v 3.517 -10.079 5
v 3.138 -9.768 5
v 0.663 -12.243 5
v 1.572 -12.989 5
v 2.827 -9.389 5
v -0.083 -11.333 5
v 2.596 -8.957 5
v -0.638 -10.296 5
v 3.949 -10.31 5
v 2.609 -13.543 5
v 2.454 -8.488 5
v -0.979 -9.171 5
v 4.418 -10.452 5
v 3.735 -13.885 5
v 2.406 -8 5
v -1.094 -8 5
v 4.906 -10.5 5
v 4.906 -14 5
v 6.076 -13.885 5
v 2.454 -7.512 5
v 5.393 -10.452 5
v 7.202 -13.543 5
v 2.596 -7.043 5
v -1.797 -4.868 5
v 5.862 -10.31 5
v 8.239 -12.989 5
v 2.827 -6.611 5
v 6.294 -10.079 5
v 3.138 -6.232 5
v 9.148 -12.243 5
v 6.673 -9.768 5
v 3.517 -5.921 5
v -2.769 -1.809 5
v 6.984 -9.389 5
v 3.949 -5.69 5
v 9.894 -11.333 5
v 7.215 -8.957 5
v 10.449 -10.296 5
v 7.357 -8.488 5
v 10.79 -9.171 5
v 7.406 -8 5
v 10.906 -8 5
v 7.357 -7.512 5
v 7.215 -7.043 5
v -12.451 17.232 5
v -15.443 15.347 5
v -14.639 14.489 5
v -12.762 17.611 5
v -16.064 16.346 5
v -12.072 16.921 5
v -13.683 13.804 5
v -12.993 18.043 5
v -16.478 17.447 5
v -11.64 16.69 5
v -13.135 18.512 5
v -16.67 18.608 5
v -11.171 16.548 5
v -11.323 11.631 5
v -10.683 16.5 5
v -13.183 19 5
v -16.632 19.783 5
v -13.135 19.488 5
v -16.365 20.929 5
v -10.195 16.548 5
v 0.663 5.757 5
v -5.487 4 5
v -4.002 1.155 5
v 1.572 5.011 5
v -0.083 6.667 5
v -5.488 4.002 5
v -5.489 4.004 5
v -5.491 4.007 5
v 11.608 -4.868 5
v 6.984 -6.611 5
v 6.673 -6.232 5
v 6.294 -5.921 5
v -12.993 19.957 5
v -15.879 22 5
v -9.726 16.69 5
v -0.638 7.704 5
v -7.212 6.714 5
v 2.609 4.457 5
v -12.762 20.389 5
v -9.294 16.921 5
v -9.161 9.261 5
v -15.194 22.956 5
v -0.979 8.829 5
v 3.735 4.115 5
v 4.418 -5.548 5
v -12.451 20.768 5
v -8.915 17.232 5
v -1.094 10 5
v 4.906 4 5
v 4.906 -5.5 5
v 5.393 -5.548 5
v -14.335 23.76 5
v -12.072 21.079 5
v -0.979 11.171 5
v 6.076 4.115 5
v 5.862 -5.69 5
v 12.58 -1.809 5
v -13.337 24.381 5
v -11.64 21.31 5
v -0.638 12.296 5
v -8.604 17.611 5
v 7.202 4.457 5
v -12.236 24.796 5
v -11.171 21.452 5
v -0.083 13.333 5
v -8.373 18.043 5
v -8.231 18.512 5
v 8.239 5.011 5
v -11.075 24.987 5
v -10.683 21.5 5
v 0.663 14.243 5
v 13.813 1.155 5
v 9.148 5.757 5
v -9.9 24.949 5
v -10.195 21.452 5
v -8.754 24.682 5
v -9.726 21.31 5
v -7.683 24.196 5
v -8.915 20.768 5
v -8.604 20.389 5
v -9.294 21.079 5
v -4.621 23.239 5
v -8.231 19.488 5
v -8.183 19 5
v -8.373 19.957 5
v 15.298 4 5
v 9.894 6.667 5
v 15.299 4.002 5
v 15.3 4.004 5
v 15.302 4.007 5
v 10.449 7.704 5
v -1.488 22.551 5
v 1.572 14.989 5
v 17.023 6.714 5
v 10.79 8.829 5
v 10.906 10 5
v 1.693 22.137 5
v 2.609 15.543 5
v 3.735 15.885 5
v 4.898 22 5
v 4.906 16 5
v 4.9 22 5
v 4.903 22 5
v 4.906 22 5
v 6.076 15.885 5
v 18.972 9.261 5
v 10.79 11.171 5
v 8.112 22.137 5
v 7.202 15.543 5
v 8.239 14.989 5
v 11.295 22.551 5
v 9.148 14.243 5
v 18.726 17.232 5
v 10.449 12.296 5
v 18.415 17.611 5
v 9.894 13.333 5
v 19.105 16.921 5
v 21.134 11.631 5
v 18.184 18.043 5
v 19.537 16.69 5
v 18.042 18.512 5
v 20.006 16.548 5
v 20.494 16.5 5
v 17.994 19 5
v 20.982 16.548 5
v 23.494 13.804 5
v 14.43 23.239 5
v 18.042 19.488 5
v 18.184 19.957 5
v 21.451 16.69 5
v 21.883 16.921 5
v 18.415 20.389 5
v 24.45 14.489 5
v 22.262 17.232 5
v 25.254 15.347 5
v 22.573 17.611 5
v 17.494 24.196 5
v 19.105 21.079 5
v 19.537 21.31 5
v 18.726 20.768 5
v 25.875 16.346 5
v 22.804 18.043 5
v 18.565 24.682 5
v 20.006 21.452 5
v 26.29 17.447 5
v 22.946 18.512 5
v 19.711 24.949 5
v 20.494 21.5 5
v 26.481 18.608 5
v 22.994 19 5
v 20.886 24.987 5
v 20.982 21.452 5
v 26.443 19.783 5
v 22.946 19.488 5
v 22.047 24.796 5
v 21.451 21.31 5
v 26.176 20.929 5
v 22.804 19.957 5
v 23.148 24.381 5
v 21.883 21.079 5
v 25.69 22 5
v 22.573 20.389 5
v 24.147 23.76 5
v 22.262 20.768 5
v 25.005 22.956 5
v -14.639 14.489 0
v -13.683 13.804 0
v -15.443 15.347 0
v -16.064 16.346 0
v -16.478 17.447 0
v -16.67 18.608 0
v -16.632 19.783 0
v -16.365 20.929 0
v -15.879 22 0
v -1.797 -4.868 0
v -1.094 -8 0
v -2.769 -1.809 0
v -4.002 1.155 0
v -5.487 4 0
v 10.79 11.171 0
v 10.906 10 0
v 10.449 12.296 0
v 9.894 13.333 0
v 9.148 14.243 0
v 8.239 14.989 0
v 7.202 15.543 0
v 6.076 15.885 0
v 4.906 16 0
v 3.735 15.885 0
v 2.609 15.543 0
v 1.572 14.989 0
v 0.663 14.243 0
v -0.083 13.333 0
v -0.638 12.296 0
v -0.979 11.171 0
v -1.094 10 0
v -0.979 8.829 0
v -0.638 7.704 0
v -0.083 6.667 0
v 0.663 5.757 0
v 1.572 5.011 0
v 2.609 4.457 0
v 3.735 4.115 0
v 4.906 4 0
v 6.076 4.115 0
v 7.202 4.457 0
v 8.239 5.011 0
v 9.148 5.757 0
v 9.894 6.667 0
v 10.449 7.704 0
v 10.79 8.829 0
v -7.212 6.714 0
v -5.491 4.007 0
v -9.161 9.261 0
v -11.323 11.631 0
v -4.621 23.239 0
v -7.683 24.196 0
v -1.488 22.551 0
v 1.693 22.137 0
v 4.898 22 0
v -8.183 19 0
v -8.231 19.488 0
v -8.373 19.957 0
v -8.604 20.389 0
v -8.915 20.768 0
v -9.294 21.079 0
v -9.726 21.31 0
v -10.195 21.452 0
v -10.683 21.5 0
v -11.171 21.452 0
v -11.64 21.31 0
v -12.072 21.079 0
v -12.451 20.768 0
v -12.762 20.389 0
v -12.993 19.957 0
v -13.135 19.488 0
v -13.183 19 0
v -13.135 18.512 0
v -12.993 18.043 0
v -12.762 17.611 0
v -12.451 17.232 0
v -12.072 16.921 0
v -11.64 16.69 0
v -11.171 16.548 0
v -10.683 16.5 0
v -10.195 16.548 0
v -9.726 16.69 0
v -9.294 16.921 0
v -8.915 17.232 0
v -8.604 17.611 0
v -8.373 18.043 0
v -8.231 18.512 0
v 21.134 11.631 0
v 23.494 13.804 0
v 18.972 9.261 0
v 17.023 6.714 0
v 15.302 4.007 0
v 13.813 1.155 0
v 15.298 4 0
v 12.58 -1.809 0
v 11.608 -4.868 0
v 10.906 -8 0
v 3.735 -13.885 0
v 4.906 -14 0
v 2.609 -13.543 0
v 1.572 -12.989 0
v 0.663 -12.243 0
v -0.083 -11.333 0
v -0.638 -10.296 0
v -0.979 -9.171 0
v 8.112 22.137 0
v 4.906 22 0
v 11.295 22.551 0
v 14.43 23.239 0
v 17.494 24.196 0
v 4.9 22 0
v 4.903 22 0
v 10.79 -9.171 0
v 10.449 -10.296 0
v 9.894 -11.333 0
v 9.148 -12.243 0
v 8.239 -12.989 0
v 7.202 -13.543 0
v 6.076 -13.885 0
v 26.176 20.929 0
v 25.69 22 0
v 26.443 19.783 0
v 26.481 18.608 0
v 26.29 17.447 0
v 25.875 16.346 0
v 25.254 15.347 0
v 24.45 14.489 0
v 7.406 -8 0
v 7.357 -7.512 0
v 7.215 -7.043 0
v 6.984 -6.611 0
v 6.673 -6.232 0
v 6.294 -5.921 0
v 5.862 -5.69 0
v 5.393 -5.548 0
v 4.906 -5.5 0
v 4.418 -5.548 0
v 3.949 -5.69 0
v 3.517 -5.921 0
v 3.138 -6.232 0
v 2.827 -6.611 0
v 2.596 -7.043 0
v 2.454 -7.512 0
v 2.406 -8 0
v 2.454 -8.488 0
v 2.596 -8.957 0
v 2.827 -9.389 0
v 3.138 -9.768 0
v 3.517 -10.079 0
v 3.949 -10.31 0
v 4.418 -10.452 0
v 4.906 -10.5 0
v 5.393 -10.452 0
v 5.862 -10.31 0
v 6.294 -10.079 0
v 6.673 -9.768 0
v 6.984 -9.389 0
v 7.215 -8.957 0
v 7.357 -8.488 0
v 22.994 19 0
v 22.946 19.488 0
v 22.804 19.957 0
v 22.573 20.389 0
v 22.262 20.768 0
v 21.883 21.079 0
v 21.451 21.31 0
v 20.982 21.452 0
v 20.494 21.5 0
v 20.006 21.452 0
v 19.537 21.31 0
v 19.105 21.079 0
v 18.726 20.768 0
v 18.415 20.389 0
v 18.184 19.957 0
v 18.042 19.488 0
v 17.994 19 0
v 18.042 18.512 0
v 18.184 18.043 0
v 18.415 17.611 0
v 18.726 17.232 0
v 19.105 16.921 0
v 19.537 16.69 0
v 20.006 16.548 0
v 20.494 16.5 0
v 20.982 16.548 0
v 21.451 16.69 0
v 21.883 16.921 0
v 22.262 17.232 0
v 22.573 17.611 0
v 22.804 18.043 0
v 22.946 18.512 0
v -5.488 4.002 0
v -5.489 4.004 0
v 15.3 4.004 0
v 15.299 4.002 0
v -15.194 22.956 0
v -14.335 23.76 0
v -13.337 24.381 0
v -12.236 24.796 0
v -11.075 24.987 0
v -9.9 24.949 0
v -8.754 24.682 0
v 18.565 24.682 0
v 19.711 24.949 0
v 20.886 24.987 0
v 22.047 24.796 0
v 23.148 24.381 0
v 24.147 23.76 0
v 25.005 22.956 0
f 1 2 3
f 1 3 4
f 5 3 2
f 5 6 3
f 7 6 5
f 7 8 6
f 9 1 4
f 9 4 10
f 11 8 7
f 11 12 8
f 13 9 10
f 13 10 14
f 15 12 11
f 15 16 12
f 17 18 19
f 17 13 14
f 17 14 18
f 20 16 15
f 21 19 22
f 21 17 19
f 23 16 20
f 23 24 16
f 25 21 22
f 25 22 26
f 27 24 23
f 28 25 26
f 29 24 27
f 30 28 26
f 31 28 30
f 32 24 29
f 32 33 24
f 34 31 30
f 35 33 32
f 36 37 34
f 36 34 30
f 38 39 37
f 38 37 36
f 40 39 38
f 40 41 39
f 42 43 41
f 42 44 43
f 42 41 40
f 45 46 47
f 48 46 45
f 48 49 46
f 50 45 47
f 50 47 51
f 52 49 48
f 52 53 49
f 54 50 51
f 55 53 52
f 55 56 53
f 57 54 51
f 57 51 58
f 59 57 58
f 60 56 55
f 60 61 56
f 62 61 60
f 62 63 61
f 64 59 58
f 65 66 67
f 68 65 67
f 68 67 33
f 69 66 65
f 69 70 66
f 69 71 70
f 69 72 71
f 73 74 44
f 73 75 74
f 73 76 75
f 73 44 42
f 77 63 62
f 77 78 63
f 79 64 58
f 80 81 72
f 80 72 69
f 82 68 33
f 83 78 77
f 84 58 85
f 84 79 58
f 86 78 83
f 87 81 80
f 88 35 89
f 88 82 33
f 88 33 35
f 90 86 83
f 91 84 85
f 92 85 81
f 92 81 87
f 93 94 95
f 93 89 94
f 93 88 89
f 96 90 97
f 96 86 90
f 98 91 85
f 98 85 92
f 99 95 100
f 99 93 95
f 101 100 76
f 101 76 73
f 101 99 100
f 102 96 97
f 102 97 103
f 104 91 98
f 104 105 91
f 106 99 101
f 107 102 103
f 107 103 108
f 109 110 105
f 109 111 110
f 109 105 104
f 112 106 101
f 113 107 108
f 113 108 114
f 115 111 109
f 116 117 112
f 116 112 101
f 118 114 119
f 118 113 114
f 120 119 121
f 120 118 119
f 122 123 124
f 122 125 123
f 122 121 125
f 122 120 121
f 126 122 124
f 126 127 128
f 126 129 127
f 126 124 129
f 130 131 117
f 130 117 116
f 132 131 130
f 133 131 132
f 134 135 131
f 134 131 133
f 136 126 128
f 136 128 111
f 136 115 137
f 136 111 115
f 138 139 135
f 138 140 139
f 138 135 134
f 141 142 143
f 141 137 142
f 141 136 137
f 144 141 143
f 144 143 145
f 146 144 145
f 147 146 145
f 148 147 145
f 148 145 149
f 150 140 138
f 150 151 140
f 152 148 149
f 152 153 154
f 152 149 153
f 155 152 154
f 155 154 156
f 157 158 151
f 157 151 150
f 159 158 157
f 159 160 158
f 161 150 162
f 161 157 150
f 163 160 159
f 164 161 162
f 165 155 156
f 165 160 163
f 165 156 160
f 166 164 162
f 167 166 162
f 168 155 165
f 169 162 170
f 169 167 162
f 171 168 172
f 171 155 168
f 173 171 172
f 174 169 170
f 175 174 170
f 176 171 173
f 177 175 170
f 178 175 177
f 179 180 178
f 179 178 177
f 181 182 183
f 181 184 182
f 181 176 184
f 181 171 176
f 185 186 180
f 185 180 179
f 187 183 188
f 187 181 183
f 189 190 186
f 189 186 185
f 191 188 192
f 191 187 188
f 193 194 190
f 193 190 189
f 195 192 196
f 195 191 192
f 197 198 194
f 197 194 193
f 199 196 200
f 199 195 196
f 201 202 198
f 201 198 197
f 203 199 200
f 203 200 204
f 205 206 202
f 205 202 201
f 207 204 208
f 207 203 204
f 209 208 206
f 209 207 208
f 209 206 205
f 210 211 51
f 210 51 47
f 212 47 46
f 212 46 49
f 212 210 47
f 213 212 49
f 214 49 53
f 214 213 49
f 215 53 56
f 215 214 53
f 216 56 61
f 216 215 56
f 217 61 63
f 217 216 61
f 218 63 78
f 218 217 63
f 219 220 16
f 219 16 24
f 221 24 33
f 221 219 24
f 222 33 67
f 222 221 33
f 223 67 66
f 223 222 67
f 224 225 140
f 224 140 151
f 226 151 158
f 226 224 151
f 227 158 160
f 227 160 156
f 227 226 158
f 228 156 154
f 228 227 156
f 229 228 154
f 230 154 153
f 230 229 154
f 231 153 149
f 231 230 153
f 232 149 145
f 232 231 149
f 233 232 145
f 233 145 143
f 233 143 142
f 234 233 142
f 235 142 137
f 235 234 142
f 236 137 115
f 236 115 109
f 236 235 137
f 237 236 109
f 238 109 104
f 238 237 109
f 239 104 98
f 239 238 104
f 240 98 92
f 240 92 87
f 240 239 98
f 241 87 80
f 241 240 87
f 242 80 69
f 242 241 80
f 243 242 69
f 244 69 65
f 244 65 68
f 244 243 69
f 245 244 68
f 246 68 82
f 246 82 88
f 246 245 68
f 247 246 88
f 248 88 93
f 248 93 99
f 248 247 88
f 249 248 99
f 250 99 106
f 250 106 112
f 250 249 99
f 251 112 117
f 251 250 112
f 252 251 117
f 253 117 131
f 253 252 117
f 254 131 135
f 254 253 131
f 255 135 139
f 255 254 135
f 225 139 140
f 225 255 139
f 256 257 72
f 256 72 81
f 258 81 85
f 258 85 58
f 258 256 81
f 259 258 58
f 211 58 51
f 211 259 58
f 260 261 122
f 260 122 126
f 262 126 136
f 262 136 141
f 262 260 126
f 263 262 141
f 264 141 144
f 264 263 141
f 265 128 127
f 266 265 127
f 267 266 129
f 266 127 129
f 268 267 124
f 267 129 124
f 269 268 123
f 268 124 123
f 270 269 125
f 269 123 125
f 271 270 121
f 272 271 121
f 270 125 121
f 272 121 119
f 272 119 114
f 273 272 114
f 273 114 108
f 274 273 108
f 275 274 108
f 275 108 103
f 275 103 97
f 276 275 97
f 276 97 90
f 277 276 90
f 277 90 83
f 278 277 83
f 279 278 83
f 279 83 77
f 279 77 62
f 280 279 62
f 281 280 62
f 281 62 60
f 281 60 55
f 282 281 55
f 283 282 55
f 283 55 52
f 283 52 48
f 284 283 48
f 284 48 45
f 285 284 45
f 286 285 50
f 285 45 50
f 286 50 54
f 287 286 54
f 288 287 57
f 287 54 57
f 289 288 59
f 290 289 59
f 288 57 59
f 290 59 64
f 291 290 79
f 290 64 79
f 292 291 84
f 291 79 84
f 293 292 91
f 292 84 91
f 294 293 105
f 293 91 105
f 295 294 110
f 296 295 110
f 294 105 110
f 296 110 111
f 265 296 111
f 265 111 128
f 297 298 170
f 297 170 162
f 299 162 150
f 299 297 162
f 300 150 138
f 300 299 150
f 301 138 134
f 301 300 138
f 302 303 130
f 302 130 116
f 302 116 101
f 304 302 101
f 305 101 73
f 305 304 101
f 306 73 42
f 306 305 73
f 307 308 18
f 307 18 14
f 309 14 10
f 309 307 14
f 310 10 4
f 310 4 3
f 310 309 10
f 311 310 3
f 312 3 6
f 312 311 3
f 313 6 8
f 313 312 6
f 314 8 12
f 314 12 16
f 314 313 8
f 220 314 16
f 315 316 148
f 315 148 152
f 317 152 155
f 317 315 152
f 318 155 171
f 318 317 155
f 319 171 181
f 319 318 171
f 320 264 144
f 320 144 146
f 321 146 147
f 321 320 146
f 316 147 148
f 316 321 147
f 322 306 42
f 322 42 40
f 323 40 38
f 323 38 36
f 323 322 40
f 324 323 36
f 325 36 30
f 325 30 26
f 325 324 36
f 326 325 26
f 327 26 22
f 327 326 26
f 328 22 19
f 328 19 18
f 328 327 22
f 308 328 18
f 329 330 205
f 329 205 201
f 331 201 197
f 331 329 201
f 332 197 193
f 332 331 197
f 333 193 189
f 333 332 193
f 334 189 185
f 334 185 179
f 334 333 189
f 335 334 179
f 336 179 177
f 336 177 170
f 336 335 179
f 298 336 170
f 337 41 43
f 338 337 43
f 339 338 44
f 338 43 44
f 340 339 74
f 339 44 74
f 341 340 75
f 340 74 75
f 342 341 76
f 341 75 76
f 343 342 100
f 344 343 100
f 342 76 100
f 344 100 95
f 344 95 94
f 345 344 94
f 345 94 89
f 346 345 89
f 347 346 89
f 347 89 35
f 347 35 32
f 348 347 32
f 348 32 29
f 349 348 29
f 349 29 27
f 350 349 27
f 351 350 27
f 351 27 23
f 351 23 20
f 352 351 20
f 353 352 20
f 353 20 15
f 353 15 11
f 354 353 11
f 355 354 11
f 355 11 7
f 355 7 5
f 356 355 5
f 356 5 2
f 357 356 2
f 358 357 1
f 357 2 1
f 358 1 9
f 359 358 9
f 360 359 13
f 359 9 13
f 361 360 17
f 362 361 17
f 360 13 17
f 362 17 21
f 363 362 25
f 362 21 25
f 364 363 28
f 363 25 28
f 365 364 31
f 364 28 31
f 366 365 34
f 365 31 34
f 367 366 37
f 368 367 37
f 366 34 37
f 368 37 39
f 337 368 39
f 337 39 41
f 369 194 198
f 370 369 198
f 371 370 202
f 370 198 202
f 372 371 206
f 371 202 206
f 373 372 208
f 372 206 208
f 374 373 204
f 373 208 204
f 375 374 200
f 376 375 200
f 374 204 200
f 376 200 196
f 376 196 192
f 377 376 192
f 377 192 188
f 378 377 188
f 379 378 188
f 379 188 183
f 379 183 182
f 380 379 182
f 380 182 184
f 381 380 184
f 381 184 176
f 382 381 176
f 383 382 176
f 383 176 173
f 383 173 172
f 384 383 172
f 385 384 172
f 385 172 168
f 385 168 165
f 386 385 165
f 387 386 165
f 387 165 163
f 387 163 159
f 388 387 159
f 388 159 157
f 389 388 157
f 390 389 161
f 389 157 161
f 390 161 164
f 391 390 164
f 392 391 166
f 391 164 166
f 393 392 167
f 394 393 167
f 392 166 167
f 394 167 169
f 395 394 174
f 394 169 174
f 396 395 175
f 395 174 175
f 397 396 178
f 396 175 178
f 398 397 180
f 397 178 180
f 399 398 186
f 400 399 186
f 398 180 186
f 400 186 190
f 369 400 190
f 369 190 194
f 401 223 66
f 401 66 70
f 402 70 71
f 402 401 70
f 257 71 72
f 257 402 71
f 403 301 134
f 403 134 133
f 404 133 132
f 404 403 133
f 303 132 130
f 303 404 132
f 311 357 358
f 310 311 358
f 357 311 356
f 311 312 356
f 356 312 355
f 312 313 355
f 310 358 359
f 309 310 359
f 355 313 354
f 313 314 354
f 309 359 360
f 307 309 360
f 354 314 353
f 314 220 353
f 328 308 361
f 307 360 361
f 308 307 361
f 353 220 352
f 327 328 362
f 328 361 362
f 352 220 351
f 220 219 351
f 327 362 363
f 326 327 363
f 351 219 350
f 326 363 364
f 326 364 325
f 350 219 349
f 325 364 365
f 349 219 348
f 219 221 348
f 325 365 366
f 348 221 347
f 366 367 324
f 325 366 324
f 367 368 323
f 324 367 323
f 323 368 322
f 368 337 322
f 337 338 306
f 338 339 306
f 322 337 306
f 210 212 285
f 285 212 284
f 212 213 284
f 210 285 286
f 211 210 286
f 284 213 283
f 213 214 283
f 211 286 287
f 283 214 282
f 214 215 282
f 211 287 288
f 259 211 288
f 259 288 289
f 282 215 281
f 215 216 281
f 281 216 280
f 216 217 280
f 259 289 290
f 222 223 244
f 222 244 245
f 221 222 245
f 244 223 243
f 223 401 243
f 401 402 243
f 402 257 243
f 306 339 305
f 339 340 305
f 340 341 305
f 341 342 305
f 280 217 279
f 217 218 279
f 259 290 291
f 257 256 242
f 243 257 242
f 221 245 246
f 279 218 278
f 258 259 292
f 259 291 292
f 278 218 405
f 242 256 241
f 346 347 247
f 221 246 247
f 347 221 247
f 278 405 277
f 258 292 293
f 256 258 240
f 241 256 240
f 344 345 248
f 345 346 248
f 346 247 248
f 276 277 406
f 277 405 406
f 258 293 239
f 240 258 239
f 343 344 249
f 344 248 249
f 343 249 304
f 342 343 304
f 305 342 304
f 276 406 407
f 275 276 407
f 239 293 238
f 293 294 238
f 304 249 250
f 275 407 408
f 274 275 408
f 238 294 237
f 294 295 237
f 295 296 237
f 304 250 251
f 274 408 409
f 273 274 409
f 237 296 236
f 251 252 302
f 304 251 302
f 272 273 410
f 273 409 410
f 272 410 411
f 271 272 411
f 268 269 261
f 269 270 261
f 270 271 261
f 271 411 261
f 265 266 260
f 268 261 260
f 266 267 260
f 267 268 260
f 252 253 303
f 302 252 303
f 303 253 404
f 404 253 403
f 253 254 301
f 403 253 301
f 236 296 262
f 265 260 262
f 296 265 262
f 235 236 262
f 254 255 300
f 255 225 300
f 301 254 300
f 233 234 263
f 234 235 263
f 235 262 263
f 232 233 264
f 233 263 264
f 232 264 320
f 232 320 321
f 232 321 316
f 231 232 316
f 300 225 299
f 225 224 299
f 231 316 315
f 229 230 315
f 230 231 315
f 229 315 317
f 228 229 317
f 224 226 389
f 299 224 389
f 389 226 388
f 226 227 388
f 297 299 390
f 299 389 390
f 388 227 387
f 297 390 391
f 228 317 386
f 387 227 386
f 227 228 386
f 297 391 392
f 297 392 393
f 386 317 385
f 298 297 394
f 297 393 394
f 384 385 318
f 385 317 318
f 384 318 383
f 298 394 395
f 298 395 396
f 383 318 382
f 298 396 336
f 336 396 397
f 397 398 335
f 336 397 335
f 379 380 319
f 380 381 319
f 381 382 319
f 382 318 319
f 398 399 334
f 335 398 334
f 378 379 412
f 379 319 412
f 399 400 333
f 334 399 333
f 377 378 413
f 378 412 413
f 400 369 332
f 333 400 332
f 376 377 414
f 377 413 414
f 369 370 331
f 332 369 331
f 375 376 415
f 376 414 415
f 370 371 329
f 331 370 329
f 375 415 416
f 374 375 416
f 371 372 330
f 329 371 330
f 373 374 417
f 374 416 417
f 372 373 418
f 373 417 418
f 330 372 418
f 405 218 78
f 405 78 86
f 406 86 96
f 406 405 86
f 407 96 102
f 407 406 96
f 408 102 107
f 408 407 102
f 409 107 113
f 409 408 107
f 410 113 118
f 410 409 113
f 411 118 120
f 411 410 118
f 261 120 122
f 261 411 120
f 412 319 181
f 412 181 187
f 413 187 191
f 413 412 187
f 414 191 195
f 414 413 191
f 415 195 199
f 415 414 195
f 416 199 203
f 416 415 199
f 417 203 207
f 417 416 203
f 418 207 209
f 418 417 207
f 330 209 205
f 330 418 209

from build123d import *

# Parameters (mm, degrees)
ESBO_O1_R                 = 24
ESBO_O1_R_2               = 6
RESSALTO_EXTRUS_O1_DEPTH  = 5
ESBO_O2_R                 = 2.5
CORTE_EXTRUS_O1_DEPTH     = 45.905785333
CORTE_EXTRUS_O2_START     = -5
CORTE_EXTRUS_O2_OUTLINE_R = 2.5
CORTE_EXTRUS_O2_DEPTH     = 5


# Read off the part's stored shape, not the designer's step: Corte-extrusão2
with BuildPart() as part:
    # Esboço1 → Ressalto-extrusão1 (new body)
    with BuildSketch(Plane.XY):
        with Locations((4.905528128, 10)):
            Circle(ESBO_O1_R)
        with Locations((4.905528128, 10)):
            Circle(ESBO_O1_R_2, mode=Mode.SUBTRACT)
    extrude(amount=RESSALTO_EXTRUS_O1_DEPTH)

    # Esboço2 → Corte-extrusão1 (cut, through all)
    with BuildSketch(Plane.XY.offset(5)):
        with Locations((4.905528128, 28)):
            Circle(ESBO_O2_R)
        with Locations((20.493985396, 19)):
            Circle(ESBO_O2_R)
        with Locations((20.493985396, 1)):
            Circle(ESBO_O2_R)
        with Locations((4.905528128, -8)):
            Circle(ESBO_O2_R)
        with Locations((-10.68292914, 1)):
            Circle(ESBO_O2_R)
        with Locations((-10.68292914, 19)):
            Circle(ESBO_O2_R)
    extrude(amount=-CORTE_EXTRUS_O1_DEPTH, mode=Mode.SUBTRACT)

    # Corte-extrusão2 outline → Corte-extrusão2 (cut)
    # profile 1 of 3: a face of its own
    with BuildSketch(Plane.XY.offset(5).offset(CORTE_EXTRUS_O2_START)):
        with BuildLine():
            ThreePointArc((4.897969025, 21.999997619), (4.901748576, 21.999999405), (4.905528128, 22))
            ThreePointArc((4.905528128, 22), (11.295284197, 22.550508098), (17.493985396, 24.196152423))
            ThreePointArc((17.493985396, 24.196152423), (22.046899667, 24.795554958), (25.690137819, 22))
            ThreePointArc((25.690137819, 22), (4.905528128, 34), (-15.879081563, 22))
            ThreePointArc((-15.879081563, 22), (-12.235843411, 24.795554958), (-7.68292914, 24.196152423))
            ThreePointArc((-7.68292914, 24.196152423), (-1.487951224, 22.551157849), (4.897969025, 21.999997619))
        make_face()
        with Locations((4.905528128, 28)):
            Circle(CORTE_EXTRUS_O2_OUTLINE_R, mode=Mode.SUBTRACT)
    # profile 2 of 3: a face of its own
    with BuildSketch(Plane.XY.offset(5).offset(CORTE_EXTRUS_O2_START)):
        with BuildLine():
            ThreePointArc((4.905528128, -14), (25.690137819, -2), (25.690137819, 22))
            ThreePointArc((25.690137819, 22), (26.289540354, 17.447085729), (23.493985396, 13.803847577))
            ThreePointArc((23.493985396, 13.803847577), (18.971889348, 9.261336613), (15.301607732, 4.006549141))
            ThreePointArc((15.301607732, 4.006549141), (15.299722234, 4.003273486), (15.297832974, 4))
            ThreePointArc((15.297832974, 4), (12.579708936, -1.808945129), (10.905528128, -8))
            ThreePointArc((10.905528128, -8), (9.148168815, -12.242640687), (4.905528128, -14))
        make_face()
        with Locations((20.493985396, 1)):
            Circle(CORTE_EXTRUS_O2_OUTLINE_R, mode=Mode.SUBTRACT)
    # profile 3 of 3: a face of its own
    with BuildSketch(Plane.XY.offset(5).offset(CORTE_EXTRUS_O2_START)):
        with BuildLine():
            ThreePointArc((-13.68292914, 13.803847577), (-16.478484098, 17.447085729), (-15.879081563, 22))
            ThreePointArc((-15.879081563, 22), (-15.879081563, -2), (4.905528128, -14))
            ThreePointArc((4.905528128, -14), (0.662887441, -12.242640687), (-1.094471872, -8))
            ThreePointArc((-1.094471872, -8), (-2.76865268, -1.808945129), (-5.486776717, 4))
            ThreePointArc((-5.486776717, 4), (-5.488665978, 4.003273485), (-5.490554207, 4.006547566))
            ThreePointArc((-5.490554207, 4.006547566), (-9.160833092, 9.261336613), (-13.68292914, 13.803847577))
        make_face()
        with Locations((-10.68292914, 1)):
            Circle(CORTE_EXTRUS_O2_OUTLINE_R, mode=Mode.SUBTRACT)
    extrude(amount=CORTE_EXTRUS_O2_DEPTH, mode=Mode.SUBTRACT)


solid = part.part
